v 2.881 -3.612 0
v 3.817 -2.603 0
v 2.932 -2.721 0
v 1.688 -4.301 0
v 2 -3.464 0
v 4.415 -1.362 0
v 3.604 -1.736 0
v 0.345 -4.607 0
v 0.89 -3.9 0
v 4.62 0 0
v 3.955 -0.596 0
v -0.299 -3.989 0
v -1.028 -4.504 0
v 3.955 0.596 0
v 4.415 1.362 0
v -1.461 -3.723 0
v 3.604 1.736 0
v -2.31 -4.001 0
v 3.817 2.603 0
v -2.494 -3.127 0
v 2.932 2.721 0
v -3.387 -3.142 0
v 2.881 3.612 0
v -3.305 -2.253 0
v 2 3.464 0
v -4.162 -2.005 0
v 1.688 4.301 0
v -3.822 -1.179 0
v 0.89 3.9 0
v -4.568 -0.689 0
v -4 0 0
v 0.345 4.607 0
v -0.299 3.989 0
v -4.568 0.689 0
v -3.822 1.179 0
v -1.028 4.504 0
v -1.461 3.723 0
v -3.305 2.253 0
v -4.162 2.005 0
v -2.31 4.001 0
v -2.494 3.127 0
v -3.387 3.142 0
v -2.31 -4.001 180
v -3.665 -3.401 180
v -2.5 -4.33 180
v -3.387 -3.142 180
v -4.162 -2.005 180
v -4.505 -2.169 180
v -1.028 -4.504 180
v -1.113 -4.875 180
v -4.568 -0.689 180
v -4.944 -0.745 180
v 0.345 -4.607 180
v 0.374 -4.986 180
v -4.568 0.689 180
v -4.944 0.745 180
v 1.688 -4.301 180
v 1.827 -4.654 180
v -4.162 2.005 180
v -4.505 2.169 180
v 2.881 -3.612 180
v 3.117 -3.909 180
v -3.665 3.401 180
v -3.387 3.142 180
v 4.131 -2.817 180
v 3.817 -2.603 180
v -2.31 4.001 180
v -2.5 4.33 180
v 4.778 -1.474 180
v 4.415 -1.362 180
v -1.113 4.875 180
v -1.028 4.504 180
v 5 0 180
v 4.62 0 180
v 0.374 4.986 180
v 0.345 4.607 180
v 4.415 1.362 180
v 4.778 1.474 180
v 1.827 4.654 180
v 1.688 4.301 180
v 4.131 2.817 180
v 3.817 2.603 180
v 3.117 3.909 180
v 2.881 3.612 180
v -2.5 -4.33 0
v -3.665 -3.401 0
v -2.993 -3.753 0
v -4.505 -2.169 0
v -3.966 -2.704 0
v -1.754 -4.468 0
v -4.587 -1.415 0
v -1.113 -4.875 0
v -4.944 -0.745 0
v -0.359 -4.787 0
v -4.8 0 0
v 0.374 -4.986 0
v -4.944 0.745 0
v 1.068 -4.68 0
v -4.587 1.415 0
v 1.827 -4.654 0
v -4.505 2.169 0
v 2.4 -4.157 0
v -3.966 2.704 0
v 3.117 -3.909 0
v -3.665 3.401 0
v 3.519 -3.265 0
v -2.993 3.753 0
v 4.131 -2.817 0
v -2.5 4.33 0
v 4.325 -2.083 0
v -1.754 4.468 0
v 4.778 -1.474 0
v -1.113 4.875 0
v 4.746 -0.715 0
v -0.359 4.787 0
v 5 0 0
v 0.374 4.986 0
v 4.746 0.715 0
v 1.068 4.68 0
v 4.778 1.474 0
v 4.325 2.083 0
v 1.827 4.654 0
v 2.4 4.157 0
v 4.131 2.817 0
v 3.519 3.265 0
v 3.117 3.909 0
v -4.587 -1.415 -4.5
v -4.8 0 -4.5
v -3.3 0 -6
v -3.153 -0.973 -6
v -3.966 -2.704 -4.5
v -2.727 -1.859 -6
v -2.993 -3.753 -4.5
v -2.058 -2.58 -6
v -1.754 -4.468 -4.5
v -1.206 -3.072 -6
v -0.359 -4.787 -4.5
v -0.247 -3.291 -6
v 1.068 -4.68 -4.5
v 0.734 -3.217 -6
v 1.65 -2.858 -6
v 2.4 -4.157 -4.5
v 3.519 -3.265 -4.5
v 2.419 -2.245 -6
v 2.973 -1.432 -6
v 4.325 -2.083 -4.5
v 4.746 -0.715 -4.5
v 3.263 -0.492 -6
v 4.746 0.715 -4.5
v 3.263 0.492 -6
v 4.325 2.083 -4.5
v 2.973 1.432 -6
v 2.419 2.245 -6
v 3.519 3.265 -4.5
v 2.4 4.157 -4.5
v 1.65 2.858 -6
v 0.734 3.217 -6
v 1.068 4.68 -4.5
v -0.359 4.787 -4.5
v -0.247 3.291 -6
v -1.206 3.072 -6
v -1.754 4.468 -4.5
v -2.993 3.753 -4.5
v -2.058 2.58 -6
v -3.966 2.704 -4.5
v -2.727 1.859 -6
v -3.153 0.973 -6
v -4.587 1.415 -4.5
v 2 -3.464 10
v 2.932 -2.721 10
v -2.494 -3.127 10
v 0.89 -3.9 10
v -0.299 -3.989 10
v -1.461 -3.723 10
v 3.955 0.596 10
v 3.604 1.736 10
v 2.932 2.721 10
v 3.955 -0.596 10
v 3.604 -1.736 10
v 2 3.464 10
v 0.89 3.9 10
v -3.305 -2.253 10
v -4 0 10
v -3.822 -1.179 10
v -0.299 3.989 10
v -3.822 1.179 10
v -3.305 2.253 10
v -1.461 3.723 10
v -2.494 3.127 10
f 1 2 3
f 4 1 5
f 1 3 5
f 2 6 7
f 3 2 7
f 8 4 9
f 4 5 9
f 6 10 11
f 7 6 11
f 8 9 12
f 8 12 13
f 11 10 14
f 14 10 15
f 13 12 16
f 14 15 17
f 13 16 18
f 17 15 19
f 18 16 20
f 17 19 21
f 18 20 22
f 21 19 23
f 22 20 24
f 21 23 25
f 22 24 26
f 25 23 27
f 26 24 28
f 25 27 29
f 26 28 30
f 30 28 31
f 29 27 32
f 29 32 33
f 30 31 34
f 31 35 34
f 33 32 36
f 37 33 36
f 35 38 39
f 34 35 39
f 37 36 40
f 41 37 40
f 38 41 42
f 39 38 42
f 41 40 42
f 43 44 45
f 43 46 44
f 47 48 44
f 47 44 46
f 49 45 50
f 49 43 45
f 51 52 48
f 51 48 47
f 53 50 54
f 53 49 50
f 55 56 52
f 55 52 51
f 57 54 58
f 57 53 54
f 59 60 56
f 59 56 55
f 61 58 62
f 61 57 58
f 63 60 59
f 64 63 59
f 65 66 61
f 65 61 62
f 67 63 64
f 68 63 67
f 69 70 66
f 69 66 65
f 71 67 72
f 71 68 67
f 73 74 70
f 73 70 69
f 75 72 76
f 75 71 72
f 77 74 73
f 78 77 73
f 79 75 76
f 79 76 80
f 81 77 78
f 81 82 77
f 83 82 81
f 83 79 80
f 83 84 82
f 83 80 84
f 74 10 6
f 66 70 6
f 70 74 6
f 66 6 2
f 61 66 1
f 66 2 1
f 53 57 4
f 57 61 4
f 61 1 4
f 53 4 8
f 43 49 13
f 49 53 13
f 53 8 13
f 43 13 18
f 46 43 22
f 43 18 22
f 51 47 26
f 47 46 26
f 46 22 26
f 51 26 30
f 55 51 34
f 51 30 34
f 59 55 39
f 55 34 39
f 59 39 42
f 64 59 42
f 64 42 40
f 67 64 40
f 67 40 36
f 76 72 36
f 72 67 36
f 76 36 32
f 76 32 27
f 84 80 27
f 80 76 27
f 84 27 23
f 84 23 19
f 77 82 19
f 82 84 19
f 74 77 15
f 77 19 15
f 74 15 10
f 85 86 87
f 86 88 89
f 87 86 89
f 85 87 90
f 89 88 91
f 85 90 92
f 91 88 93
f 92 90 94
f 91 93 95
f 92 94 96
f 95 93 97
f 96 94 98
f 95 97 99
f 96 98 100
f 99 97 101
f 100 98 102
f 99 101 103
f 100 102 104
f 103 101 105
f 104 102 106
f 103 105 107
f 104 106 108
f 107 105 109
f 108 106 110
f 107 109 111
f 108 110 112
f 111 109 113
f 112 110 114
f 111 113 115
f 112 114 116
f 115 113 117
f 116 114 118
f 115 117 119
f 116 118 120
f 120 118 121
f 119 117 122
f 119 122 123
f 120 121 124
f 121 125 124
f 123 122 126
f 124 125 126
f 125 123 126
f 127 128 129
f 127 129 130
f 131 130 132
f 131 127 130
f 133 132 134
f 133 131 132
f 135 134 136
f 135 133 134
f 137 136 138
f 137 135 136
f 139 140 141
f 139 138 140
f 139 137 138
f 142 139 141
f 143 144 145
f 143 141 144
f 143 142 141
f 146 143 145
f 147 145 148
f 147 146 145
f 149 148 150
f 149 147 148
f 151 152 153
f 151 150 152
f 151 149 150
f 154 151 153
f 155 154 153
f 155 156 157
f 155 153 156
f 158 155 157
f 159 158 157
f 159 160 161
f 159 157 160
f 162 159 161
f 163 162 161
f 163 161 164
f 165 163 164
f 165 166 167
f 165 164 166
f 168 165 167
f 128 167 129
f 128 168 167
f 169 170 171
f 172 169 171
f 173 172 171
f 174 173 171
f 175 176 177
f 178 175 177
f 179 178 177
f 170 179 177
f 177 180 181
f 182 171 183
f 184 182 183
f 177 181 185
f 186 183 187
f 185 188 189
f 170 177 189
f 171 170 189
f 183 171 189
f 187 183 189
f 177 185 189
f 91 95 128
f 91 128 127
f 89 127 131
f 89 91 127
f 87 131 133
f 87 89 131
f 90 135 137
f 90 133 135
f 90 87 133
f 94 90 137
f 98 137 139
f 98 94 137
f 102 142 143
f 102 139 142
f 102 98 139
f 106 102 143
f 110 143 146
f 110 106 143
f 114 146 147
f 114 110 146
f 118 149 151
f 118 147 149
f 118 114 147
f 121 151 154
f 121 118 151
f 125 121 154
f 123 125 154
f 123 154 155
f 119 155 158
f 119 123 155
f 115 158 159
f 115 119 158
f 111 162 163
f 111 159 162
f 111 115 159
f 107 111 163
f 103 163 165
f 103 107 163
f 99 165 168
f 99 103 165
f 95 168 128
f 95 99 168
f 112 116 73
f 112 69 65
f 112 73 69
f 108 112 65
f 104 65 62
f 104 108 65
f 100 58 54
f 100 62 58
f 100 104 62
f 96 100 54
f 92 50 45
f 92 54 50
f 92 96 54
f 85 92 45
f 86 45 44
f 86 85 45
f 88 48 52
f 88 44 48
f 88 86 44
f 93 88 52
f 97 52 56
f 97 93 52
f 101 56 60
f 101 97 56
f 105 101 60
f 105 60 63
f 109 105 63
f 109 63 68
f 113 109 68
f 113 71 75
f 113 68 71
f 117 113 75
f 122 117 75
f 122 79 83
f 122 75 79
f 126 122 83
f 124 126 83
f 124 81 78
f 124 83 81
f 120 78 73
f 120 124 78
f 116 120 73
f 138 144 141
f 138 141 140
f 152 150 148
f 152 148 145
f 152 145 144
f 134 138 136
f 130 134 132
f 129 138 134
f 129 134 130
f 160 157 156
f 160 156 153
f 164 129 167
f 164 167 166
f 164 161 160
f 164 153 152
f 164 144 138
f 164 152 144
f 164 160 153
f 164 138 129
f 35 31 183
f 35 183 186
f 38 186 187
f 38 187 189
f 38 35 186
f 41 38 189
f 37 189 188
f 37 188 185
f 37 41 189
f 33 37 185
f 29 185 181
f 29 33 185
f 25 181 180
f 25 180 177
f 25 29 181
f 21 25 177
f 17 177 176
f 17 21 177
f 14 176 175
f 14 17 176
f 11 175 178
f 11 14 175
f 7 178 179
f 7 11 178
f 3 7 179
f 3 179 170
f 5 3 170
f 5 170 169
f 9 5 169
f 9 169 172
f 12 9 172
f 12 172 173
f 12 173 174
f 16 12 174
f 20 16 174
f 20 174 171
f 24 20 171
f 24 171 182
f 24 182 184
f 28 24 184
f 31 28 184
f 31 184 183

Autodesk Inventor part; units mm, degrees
ref_plane "YZ Plane" through (0, 0, 0) normal (1, 0, 0) x (0, 1, 0)
ref_plane "XZ Plane" through (0, 0, 0) normal (0, 1, 0) x (-1, 0, 0)
ref_plane "XY Plane" through (0, 0, 0) normal (0, 0, 1) x (1, 0, 0)
sketch "Sketch1" plane through (0, 0, 0) normal (0, 0, 1) x (1, 0, 0)
  circle A0 centre (0, 0) radius 4.62
  circle A1 centre (0, 0) radius 5
  dimension "d0" = 9.24
  dimension "d1" = 10
extrude "Extrusion1" add sketch "Sketch1" along normal blind 180
sketch "Sketch7" plane through (0, 0, 0) normal (0, 0, -1) x (-1, 0, 0)
  circle A0 centre (0, 0) radius 4
extrude "Extrusion6" add sketch "Sketch7" against normal blind 10
sketch "Sketch8" plane through (0, 0, 0) normal (0, 0, -1) x (-1, 0, 0)
  circle A0 centre (0, 0) radius 4.8
  dimension "d23" = 9.6
extrude "Extrusion7" add sketch "Sketch8" along normal blind 6
chamfer "Chamfer1" distance 1.5 angle 45 1 edges at (4.8, 0, -6)
properties part number "Acrylic 8 ID, 10 OD" material "Glass"
